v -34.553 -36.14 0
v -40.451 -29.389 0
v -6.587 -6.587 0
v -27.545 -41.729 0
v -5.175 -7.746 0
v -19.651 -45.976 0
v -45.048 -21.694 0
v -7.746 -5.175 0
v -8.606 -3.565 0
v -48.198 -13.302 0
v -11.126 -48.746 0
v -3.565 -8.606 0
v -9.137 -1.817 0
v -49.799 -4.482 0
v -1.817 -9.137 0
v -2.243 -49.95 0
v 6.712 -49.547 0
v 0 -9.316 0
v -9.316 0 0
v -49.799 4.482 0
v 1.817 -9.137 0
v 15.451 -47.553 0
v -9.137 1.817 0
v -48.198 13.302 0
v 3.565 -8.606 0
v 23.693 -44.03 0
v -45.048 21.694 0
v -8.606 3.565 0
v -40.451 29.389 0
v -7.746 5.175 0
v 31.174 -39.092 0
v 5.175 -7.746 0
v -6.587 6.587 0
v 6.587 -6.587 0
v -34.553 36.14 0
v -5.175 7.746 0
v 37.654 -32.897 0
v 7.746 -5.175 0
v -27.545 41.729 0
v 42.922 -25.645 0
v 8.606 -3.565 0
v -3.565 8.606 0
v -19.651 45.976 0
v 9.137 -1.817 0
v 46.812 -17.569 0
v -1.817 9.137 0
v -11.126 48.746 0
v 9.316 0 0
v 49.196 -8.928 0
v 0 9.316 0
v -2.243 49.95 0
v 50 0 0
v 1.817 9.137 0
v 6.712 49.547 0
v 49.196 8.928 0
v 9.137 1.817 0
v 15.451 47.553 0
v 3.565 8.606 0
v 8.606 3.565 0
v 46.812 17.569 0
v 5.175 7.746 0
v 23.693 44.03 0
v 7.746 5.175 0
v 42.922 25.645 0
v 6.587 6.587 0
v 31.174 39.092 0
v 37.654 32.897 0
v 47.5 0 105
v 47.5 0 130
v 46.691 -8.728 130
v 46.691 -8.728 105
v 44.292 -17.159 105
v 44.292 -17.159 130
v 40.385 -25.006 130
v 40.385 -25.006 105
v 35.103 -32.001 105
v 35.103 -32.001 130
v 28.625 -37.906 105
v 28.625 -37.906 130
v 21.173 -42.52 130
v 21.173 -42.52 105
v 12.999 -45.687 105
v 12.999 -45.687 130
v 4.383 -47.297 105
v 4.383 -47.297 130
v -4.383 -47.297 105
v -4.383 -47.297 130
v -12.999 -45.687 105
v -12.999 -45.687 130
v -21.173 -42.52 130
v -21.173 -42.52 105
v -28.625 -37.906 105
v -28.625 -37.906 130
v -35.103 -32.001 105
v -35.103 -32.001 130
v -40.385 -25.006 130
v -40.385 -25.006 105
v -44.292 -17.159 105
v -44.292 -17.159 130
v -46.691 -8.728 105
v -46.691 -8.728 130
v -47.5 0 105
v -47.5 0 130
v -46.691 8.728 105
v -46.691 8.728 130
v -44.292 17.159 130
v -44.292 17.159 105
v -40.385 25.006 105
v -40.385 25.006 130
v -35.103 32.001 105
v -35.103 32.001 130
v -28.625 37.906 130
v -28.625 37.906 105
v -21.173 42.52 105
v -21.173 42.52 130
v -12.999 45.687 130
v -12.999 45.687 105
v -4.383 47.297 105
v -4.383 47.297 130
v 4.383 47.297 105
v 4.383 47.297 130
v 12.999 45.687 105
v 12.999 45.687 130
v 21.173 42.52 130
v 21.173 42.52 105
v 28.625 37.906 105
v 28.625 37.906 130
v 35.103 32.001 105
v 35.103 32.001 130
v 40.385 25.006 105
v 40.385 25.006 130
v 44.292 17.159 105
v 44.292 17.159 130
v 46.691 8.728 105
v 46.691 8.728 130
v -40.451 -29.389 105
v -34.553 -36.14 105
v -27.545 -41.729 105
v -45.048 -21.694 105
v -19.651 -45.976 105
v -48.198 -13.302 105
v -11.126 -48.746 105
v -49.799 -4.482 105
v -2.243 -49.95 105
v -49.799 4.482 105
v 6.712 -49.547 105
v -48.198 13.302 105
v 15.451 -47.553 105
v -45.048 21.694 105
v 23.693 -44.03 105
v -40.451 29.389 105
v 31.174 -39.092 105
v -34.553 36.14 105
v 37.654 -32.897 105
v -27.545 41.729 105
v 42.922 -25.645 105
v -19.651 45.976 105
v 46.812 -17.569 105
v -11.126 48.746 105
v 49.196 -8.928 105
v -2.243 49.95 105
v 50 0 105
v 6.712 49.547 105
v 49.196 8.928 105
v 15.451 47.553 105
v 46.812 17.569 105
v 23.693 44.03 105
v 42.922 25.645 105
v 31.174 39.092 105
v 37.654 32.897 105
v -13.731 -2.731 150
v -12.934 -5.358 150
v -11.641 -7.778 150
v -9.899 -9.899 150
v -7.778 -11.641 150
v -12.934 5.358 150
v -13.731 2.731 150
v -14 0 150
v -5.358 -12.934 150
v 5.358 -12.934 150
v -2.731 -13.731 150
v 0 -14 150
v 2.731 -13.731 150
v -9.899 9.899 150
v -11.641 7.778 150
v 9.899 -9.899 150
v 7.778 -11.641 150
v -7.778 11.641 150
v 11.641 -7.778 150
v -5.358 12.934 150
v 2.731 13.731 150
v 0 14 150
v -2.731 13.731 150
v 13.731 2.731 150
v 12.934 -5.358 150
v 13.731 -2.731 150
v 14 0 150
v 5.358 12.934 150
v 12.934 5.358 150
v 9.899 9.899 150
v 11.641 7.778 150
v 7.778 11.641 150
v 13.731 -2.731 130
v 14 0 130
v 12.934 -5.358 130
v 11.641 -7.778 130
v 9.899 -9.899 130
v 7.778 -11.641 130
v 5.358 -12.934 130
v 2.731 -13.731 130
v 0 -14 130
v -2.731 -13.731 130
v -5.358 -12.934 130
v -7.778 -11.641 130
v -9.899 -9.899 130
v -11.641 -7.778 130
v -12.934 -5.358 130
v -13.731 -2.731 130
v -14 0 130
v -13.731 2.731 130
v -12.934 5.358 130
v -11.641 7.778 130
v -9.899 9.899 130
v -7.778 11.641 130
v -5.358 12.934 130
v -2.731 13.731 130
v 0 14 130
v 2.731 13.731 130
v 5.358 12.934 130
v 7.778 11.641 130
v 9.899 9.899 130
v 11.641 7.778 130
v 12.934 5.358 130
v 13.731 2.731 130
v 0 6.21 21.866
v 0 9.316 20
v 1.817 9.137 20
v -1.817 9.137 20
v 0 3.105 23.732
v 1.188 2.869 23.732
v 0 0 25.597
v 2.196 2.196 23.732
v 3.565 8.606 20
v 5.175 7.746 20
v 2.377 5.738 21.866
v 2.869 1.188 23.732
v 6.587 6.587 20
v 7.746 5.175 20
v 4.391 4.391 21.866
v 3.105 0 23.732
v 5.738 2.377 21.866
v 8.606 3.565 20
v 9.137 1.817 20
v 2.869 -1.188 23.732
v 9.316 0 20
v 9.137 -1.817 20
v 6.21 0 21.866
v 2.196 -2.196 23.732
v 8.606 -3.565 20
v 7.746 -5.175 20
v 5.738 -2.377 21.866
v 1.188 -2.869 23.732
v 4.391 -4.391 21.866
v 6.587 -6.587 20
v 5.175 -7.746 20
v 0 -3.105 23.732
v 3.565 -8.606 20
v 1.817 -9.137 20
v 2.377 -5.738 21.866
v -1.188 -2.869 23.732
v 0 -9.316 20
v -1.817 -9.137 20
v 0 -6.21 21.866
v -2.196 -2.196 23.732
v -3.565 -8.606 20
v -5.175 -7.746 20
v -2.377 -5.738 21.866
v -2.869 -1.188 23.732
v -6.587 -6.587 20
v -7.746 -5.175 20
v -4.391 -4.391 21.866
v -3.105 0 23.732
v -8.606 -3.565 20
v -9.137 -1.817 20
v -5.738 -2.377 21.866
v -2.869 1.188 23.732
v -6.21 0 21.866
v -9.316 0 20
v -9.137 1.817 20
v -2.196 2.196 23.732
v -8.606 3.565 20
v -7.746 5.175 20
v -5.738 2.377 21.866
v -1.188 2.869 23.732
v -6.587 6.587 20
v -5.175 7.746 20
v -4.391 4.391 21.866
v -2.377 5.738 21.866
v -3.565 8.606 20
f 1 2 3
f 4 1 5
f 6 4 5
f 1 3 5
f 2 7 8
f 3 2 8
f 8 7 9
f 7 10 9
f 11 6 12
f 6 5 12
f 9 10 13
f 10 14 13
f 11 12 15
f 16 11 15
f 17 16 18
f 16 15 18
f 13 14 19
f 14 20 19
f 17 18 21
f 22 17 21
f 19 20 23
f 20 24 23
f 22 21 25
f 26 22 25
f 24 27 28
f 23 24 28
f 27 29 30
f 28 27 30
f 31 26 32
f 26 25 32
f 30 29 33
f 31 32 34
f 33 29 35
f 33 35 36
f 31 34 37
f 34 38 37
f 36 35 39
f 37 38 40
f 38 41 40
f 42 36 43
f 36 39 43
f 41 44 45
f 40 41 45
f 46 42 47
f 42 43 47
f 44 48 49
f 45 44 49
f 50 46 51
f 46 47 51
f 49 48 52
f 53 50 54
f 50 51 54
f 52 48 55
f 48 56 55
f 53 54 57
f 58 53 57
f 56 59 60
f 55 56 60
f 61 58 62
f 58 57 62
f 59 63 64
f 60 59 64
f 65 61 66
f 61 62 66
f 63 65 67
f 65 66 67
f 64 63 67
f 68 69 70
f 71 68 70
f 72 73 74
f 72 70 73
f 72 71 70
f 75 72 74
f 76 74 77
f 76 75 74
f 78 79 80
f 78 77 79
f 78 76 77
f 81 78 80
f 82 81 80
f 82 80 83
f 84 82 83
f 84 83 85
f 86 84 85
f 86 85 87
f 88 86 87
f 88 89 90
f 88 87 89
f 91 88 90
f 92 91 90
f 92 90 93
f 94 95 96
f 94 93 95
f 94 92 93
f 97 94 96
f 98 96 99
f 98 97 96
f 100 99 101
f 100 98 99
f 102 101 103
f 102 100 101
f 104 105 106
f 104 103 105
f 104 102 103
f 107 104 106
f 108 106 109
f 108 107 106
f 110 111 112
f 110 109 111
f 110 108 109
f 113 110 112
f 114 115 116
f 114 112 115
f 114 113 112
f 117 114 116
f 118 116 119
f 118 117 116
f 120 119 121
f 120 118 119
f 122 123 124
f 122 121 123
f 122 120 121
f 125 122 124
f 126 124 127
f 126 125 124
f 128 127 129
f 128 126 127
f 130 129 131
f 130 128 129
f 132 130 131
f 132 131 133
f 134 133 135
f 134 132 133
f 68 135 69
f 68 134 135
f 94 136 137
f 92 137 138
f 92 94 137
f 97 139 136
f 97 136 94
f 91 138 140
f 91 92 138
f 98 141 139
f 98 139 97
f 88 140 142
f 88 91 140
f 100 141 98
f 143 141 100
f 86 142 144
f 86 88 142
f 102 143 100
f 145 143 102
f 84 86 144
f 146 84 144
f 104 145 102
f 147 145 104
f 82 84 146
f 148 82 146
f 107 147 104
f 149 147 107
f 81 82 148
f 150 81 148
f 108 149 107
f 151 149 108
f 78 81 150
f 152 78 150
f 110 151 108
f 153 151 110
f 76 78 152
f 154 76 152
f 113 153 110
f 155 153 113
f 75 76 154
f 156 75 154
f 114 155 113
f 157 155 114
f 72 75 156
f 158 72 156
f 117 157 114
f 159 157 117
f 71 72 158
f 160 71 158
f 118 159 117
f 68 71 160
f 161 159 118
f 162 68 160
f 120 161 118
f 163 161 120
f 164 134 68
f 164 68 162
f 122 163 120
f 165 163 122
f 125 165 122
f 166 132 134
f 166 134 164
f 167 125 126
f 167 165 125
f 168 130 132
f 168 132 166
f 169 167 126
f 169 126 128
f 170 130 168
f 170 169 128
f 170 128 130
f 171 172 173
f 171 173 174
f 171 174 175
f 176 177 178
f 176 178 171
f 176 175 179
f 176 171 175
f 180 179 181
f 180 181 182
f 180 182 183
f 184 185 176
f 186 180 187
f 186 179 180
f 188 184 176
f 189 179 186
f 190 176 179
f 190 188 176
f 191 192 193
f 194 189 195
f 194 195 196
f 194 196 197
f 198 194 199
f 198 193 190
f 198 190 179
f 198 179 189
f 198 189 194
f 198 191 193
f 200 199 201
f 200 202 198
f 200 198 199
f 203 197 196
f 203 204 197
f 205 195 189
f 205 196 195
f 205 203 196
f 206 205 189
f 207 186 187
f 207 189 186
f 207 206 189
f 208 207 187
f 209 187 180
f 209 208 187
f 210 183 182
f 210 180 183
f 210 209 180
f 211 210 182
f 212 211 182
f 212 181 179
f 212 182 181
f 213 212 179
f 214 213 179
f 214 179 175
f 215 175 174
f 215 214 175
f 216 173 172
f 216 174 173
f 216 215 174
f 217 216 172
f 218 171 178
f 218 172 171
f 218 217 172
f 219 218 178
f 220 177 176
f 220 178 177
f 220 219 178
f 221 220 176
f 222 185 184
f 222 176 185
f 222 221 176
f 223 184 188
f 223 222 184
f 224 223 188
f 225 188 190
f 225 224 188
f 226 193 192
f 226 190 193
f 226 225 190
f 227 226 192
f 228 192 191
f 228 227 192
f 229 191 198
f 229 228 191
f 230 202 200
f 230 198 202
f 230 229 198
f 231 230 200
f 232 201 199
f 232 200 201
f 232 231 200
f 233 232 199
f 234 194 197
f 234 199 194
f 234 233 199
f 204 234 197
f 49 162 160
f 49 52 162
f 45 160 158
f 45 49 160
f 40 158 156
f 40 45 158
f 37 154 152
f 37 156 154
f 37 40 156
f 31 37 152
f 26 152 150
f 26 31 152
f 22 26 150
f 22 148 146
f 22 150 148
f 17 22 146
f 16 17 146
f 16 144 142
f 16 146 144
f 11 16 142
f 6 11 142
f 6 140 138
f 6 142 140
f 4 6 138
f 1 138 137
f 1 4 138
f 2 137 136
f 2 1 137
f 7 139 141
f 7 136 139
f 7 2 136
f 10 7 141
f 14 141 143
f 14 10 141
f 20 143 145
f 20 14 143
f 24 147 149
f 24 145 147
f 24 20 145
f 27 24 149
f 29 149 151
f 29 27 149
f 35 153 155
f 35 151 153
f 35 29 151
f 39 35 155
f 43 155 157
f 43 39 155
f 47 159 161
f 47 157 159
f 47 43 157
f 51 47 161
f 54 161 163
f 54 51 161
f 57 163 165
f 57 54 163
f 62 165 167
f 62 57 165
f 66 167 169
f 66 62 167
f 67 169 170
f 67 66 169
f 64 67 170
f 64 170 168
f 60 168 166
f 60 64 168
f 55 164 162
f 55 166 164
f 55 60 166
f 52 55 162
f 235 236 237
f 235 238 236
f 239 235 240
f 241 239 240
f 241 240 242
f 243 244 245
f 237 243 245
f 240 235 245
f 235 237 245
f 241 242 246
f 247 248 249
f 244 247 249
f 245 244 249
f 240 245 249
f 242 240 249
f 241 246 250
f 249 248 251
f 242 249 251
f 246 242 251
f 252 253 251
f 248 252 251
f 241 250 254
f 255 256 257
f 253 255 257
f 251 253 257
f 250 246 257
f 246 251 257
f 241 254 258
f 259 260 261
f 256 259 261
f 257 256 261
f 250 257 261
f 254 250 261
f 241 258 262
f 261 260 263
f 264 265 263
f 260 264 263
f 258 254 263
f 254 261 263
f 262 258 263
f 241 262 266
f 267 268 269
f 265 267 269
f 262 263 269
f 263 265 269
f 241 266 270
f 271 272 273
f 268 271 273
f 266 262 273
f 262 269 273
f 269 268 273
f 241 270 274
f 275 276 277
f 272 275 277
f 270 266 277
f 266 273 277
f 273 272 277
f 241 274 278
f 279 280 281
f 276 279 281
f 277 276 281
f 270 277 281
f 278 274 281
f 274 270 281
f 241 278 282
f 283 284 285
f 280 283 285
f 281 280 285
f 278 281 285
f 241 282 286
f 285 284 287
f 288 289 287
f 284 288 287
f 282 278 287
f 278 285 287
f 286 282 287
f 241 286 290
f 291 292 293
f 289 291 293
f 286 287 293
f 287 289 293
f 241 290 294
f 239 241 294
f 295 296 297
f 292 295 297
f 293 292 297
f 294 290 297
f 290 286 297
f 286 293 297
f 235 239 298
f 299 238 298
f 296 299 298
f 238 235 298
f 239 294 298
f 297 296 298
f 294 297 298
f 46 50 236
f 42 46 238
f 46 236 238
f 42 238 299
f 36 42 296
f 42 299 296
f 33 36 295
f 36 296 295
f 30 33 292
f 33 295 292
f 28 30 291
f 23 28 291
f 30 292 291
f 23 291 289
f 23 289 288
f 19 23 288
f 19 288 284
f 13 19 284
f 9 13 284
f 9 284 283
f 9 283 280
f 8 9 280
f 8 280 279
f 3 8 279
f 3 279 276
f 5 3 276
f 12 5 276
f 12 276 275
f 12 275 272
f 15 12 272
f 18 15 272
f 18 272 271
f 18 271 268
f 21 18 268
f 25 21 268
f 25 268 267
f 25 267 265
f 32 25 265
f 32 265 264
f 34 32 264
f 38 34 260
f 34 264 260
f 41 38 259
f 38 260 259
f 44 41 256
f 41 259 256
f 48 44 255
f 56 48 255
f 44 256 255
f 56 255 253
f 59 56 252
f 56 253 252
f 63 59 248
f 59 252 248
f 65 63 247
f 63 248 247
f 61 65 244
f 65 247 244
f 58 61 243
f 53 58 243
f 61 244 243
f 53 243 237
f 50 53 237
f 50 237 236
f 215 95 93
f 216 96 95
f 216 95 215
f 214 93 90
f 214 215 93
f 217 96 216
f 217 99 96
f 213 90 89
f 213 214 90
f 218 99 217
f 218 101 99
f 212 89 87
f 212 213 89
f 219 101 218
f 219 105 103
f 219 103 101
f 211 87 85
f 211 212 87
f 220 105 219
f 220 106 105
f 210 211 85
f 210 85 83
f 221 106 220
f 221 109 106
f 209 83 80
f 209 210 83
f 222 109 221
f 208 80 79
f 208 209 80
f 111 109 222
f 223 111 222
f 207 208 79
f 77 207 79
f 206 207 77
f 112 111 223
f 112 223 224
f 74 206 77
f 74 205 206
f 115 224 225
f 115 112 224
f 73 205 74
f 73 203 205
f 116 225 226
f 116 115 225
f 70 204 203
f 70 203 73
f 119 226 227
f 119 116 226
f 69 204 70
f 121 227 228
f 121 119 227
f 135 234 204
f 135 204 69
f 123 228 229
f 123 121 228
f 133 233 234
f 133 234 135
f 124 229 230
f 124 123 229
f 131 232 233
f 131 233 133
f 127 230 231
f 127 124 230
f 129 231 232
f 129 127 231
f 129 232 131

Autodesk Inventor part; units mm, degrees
ref_plane "YZ Plane" through (0, 0, 0) normal (1, 0, 0) x (0, 1, 0)
ref_plane "XZ Plane" through (0, 0, 0) normal (0, 1, 0) x (-1, 0, 0)
ref_plane "XY Plane" through (0, 0, 0) normal (0, 0, 1) x (1, 0, 0)
sketch "Sketch1" plane through (0, 0, 0) normal (0, 1, 0) x (-1, 0, 0)
  line L0 (0, 0) -> (0, 150)
  line L1 (0, 150) -> (-14, 150)
  line L2 (-14, 150) -> (-14, 130)
  line L3 (-14, 130) -> (-47.5, 130)
  line L4 (-47.5, 130) -> (-47.5, 105)
  line L5 (-47.5, 105) -> (-50, 105)
  line L6 (-50, 105) -> (-50, 0)
  line L7 (-50, 0) -> (0, 0)
  dimension "d0" = 20
  dimension "d1" = 130
  dimension "d2" = 95
  dimension "d3" = 100
  dimension "d4" = 25
  dimension "d5" = 28
revolve "Revolution1" add sketch "Sketch1" angle 360 about axis through (0, 0, 0) along (0, 0, 1)
sketch "Sketch2" plane through (0, 0, 0) normal (0, 0, -1) x (-1, 0, 0)
  point P0 (0, 0)
hole "Hole1" at (0, 0, 0) direction (0, 0, 1) diameter 18.631 depth 20 tip angle 118 thread size "G20.955x1.814" designation "G 1/2" standard "ISO Pipe Threads"
properties part number "Pulse compensator"
